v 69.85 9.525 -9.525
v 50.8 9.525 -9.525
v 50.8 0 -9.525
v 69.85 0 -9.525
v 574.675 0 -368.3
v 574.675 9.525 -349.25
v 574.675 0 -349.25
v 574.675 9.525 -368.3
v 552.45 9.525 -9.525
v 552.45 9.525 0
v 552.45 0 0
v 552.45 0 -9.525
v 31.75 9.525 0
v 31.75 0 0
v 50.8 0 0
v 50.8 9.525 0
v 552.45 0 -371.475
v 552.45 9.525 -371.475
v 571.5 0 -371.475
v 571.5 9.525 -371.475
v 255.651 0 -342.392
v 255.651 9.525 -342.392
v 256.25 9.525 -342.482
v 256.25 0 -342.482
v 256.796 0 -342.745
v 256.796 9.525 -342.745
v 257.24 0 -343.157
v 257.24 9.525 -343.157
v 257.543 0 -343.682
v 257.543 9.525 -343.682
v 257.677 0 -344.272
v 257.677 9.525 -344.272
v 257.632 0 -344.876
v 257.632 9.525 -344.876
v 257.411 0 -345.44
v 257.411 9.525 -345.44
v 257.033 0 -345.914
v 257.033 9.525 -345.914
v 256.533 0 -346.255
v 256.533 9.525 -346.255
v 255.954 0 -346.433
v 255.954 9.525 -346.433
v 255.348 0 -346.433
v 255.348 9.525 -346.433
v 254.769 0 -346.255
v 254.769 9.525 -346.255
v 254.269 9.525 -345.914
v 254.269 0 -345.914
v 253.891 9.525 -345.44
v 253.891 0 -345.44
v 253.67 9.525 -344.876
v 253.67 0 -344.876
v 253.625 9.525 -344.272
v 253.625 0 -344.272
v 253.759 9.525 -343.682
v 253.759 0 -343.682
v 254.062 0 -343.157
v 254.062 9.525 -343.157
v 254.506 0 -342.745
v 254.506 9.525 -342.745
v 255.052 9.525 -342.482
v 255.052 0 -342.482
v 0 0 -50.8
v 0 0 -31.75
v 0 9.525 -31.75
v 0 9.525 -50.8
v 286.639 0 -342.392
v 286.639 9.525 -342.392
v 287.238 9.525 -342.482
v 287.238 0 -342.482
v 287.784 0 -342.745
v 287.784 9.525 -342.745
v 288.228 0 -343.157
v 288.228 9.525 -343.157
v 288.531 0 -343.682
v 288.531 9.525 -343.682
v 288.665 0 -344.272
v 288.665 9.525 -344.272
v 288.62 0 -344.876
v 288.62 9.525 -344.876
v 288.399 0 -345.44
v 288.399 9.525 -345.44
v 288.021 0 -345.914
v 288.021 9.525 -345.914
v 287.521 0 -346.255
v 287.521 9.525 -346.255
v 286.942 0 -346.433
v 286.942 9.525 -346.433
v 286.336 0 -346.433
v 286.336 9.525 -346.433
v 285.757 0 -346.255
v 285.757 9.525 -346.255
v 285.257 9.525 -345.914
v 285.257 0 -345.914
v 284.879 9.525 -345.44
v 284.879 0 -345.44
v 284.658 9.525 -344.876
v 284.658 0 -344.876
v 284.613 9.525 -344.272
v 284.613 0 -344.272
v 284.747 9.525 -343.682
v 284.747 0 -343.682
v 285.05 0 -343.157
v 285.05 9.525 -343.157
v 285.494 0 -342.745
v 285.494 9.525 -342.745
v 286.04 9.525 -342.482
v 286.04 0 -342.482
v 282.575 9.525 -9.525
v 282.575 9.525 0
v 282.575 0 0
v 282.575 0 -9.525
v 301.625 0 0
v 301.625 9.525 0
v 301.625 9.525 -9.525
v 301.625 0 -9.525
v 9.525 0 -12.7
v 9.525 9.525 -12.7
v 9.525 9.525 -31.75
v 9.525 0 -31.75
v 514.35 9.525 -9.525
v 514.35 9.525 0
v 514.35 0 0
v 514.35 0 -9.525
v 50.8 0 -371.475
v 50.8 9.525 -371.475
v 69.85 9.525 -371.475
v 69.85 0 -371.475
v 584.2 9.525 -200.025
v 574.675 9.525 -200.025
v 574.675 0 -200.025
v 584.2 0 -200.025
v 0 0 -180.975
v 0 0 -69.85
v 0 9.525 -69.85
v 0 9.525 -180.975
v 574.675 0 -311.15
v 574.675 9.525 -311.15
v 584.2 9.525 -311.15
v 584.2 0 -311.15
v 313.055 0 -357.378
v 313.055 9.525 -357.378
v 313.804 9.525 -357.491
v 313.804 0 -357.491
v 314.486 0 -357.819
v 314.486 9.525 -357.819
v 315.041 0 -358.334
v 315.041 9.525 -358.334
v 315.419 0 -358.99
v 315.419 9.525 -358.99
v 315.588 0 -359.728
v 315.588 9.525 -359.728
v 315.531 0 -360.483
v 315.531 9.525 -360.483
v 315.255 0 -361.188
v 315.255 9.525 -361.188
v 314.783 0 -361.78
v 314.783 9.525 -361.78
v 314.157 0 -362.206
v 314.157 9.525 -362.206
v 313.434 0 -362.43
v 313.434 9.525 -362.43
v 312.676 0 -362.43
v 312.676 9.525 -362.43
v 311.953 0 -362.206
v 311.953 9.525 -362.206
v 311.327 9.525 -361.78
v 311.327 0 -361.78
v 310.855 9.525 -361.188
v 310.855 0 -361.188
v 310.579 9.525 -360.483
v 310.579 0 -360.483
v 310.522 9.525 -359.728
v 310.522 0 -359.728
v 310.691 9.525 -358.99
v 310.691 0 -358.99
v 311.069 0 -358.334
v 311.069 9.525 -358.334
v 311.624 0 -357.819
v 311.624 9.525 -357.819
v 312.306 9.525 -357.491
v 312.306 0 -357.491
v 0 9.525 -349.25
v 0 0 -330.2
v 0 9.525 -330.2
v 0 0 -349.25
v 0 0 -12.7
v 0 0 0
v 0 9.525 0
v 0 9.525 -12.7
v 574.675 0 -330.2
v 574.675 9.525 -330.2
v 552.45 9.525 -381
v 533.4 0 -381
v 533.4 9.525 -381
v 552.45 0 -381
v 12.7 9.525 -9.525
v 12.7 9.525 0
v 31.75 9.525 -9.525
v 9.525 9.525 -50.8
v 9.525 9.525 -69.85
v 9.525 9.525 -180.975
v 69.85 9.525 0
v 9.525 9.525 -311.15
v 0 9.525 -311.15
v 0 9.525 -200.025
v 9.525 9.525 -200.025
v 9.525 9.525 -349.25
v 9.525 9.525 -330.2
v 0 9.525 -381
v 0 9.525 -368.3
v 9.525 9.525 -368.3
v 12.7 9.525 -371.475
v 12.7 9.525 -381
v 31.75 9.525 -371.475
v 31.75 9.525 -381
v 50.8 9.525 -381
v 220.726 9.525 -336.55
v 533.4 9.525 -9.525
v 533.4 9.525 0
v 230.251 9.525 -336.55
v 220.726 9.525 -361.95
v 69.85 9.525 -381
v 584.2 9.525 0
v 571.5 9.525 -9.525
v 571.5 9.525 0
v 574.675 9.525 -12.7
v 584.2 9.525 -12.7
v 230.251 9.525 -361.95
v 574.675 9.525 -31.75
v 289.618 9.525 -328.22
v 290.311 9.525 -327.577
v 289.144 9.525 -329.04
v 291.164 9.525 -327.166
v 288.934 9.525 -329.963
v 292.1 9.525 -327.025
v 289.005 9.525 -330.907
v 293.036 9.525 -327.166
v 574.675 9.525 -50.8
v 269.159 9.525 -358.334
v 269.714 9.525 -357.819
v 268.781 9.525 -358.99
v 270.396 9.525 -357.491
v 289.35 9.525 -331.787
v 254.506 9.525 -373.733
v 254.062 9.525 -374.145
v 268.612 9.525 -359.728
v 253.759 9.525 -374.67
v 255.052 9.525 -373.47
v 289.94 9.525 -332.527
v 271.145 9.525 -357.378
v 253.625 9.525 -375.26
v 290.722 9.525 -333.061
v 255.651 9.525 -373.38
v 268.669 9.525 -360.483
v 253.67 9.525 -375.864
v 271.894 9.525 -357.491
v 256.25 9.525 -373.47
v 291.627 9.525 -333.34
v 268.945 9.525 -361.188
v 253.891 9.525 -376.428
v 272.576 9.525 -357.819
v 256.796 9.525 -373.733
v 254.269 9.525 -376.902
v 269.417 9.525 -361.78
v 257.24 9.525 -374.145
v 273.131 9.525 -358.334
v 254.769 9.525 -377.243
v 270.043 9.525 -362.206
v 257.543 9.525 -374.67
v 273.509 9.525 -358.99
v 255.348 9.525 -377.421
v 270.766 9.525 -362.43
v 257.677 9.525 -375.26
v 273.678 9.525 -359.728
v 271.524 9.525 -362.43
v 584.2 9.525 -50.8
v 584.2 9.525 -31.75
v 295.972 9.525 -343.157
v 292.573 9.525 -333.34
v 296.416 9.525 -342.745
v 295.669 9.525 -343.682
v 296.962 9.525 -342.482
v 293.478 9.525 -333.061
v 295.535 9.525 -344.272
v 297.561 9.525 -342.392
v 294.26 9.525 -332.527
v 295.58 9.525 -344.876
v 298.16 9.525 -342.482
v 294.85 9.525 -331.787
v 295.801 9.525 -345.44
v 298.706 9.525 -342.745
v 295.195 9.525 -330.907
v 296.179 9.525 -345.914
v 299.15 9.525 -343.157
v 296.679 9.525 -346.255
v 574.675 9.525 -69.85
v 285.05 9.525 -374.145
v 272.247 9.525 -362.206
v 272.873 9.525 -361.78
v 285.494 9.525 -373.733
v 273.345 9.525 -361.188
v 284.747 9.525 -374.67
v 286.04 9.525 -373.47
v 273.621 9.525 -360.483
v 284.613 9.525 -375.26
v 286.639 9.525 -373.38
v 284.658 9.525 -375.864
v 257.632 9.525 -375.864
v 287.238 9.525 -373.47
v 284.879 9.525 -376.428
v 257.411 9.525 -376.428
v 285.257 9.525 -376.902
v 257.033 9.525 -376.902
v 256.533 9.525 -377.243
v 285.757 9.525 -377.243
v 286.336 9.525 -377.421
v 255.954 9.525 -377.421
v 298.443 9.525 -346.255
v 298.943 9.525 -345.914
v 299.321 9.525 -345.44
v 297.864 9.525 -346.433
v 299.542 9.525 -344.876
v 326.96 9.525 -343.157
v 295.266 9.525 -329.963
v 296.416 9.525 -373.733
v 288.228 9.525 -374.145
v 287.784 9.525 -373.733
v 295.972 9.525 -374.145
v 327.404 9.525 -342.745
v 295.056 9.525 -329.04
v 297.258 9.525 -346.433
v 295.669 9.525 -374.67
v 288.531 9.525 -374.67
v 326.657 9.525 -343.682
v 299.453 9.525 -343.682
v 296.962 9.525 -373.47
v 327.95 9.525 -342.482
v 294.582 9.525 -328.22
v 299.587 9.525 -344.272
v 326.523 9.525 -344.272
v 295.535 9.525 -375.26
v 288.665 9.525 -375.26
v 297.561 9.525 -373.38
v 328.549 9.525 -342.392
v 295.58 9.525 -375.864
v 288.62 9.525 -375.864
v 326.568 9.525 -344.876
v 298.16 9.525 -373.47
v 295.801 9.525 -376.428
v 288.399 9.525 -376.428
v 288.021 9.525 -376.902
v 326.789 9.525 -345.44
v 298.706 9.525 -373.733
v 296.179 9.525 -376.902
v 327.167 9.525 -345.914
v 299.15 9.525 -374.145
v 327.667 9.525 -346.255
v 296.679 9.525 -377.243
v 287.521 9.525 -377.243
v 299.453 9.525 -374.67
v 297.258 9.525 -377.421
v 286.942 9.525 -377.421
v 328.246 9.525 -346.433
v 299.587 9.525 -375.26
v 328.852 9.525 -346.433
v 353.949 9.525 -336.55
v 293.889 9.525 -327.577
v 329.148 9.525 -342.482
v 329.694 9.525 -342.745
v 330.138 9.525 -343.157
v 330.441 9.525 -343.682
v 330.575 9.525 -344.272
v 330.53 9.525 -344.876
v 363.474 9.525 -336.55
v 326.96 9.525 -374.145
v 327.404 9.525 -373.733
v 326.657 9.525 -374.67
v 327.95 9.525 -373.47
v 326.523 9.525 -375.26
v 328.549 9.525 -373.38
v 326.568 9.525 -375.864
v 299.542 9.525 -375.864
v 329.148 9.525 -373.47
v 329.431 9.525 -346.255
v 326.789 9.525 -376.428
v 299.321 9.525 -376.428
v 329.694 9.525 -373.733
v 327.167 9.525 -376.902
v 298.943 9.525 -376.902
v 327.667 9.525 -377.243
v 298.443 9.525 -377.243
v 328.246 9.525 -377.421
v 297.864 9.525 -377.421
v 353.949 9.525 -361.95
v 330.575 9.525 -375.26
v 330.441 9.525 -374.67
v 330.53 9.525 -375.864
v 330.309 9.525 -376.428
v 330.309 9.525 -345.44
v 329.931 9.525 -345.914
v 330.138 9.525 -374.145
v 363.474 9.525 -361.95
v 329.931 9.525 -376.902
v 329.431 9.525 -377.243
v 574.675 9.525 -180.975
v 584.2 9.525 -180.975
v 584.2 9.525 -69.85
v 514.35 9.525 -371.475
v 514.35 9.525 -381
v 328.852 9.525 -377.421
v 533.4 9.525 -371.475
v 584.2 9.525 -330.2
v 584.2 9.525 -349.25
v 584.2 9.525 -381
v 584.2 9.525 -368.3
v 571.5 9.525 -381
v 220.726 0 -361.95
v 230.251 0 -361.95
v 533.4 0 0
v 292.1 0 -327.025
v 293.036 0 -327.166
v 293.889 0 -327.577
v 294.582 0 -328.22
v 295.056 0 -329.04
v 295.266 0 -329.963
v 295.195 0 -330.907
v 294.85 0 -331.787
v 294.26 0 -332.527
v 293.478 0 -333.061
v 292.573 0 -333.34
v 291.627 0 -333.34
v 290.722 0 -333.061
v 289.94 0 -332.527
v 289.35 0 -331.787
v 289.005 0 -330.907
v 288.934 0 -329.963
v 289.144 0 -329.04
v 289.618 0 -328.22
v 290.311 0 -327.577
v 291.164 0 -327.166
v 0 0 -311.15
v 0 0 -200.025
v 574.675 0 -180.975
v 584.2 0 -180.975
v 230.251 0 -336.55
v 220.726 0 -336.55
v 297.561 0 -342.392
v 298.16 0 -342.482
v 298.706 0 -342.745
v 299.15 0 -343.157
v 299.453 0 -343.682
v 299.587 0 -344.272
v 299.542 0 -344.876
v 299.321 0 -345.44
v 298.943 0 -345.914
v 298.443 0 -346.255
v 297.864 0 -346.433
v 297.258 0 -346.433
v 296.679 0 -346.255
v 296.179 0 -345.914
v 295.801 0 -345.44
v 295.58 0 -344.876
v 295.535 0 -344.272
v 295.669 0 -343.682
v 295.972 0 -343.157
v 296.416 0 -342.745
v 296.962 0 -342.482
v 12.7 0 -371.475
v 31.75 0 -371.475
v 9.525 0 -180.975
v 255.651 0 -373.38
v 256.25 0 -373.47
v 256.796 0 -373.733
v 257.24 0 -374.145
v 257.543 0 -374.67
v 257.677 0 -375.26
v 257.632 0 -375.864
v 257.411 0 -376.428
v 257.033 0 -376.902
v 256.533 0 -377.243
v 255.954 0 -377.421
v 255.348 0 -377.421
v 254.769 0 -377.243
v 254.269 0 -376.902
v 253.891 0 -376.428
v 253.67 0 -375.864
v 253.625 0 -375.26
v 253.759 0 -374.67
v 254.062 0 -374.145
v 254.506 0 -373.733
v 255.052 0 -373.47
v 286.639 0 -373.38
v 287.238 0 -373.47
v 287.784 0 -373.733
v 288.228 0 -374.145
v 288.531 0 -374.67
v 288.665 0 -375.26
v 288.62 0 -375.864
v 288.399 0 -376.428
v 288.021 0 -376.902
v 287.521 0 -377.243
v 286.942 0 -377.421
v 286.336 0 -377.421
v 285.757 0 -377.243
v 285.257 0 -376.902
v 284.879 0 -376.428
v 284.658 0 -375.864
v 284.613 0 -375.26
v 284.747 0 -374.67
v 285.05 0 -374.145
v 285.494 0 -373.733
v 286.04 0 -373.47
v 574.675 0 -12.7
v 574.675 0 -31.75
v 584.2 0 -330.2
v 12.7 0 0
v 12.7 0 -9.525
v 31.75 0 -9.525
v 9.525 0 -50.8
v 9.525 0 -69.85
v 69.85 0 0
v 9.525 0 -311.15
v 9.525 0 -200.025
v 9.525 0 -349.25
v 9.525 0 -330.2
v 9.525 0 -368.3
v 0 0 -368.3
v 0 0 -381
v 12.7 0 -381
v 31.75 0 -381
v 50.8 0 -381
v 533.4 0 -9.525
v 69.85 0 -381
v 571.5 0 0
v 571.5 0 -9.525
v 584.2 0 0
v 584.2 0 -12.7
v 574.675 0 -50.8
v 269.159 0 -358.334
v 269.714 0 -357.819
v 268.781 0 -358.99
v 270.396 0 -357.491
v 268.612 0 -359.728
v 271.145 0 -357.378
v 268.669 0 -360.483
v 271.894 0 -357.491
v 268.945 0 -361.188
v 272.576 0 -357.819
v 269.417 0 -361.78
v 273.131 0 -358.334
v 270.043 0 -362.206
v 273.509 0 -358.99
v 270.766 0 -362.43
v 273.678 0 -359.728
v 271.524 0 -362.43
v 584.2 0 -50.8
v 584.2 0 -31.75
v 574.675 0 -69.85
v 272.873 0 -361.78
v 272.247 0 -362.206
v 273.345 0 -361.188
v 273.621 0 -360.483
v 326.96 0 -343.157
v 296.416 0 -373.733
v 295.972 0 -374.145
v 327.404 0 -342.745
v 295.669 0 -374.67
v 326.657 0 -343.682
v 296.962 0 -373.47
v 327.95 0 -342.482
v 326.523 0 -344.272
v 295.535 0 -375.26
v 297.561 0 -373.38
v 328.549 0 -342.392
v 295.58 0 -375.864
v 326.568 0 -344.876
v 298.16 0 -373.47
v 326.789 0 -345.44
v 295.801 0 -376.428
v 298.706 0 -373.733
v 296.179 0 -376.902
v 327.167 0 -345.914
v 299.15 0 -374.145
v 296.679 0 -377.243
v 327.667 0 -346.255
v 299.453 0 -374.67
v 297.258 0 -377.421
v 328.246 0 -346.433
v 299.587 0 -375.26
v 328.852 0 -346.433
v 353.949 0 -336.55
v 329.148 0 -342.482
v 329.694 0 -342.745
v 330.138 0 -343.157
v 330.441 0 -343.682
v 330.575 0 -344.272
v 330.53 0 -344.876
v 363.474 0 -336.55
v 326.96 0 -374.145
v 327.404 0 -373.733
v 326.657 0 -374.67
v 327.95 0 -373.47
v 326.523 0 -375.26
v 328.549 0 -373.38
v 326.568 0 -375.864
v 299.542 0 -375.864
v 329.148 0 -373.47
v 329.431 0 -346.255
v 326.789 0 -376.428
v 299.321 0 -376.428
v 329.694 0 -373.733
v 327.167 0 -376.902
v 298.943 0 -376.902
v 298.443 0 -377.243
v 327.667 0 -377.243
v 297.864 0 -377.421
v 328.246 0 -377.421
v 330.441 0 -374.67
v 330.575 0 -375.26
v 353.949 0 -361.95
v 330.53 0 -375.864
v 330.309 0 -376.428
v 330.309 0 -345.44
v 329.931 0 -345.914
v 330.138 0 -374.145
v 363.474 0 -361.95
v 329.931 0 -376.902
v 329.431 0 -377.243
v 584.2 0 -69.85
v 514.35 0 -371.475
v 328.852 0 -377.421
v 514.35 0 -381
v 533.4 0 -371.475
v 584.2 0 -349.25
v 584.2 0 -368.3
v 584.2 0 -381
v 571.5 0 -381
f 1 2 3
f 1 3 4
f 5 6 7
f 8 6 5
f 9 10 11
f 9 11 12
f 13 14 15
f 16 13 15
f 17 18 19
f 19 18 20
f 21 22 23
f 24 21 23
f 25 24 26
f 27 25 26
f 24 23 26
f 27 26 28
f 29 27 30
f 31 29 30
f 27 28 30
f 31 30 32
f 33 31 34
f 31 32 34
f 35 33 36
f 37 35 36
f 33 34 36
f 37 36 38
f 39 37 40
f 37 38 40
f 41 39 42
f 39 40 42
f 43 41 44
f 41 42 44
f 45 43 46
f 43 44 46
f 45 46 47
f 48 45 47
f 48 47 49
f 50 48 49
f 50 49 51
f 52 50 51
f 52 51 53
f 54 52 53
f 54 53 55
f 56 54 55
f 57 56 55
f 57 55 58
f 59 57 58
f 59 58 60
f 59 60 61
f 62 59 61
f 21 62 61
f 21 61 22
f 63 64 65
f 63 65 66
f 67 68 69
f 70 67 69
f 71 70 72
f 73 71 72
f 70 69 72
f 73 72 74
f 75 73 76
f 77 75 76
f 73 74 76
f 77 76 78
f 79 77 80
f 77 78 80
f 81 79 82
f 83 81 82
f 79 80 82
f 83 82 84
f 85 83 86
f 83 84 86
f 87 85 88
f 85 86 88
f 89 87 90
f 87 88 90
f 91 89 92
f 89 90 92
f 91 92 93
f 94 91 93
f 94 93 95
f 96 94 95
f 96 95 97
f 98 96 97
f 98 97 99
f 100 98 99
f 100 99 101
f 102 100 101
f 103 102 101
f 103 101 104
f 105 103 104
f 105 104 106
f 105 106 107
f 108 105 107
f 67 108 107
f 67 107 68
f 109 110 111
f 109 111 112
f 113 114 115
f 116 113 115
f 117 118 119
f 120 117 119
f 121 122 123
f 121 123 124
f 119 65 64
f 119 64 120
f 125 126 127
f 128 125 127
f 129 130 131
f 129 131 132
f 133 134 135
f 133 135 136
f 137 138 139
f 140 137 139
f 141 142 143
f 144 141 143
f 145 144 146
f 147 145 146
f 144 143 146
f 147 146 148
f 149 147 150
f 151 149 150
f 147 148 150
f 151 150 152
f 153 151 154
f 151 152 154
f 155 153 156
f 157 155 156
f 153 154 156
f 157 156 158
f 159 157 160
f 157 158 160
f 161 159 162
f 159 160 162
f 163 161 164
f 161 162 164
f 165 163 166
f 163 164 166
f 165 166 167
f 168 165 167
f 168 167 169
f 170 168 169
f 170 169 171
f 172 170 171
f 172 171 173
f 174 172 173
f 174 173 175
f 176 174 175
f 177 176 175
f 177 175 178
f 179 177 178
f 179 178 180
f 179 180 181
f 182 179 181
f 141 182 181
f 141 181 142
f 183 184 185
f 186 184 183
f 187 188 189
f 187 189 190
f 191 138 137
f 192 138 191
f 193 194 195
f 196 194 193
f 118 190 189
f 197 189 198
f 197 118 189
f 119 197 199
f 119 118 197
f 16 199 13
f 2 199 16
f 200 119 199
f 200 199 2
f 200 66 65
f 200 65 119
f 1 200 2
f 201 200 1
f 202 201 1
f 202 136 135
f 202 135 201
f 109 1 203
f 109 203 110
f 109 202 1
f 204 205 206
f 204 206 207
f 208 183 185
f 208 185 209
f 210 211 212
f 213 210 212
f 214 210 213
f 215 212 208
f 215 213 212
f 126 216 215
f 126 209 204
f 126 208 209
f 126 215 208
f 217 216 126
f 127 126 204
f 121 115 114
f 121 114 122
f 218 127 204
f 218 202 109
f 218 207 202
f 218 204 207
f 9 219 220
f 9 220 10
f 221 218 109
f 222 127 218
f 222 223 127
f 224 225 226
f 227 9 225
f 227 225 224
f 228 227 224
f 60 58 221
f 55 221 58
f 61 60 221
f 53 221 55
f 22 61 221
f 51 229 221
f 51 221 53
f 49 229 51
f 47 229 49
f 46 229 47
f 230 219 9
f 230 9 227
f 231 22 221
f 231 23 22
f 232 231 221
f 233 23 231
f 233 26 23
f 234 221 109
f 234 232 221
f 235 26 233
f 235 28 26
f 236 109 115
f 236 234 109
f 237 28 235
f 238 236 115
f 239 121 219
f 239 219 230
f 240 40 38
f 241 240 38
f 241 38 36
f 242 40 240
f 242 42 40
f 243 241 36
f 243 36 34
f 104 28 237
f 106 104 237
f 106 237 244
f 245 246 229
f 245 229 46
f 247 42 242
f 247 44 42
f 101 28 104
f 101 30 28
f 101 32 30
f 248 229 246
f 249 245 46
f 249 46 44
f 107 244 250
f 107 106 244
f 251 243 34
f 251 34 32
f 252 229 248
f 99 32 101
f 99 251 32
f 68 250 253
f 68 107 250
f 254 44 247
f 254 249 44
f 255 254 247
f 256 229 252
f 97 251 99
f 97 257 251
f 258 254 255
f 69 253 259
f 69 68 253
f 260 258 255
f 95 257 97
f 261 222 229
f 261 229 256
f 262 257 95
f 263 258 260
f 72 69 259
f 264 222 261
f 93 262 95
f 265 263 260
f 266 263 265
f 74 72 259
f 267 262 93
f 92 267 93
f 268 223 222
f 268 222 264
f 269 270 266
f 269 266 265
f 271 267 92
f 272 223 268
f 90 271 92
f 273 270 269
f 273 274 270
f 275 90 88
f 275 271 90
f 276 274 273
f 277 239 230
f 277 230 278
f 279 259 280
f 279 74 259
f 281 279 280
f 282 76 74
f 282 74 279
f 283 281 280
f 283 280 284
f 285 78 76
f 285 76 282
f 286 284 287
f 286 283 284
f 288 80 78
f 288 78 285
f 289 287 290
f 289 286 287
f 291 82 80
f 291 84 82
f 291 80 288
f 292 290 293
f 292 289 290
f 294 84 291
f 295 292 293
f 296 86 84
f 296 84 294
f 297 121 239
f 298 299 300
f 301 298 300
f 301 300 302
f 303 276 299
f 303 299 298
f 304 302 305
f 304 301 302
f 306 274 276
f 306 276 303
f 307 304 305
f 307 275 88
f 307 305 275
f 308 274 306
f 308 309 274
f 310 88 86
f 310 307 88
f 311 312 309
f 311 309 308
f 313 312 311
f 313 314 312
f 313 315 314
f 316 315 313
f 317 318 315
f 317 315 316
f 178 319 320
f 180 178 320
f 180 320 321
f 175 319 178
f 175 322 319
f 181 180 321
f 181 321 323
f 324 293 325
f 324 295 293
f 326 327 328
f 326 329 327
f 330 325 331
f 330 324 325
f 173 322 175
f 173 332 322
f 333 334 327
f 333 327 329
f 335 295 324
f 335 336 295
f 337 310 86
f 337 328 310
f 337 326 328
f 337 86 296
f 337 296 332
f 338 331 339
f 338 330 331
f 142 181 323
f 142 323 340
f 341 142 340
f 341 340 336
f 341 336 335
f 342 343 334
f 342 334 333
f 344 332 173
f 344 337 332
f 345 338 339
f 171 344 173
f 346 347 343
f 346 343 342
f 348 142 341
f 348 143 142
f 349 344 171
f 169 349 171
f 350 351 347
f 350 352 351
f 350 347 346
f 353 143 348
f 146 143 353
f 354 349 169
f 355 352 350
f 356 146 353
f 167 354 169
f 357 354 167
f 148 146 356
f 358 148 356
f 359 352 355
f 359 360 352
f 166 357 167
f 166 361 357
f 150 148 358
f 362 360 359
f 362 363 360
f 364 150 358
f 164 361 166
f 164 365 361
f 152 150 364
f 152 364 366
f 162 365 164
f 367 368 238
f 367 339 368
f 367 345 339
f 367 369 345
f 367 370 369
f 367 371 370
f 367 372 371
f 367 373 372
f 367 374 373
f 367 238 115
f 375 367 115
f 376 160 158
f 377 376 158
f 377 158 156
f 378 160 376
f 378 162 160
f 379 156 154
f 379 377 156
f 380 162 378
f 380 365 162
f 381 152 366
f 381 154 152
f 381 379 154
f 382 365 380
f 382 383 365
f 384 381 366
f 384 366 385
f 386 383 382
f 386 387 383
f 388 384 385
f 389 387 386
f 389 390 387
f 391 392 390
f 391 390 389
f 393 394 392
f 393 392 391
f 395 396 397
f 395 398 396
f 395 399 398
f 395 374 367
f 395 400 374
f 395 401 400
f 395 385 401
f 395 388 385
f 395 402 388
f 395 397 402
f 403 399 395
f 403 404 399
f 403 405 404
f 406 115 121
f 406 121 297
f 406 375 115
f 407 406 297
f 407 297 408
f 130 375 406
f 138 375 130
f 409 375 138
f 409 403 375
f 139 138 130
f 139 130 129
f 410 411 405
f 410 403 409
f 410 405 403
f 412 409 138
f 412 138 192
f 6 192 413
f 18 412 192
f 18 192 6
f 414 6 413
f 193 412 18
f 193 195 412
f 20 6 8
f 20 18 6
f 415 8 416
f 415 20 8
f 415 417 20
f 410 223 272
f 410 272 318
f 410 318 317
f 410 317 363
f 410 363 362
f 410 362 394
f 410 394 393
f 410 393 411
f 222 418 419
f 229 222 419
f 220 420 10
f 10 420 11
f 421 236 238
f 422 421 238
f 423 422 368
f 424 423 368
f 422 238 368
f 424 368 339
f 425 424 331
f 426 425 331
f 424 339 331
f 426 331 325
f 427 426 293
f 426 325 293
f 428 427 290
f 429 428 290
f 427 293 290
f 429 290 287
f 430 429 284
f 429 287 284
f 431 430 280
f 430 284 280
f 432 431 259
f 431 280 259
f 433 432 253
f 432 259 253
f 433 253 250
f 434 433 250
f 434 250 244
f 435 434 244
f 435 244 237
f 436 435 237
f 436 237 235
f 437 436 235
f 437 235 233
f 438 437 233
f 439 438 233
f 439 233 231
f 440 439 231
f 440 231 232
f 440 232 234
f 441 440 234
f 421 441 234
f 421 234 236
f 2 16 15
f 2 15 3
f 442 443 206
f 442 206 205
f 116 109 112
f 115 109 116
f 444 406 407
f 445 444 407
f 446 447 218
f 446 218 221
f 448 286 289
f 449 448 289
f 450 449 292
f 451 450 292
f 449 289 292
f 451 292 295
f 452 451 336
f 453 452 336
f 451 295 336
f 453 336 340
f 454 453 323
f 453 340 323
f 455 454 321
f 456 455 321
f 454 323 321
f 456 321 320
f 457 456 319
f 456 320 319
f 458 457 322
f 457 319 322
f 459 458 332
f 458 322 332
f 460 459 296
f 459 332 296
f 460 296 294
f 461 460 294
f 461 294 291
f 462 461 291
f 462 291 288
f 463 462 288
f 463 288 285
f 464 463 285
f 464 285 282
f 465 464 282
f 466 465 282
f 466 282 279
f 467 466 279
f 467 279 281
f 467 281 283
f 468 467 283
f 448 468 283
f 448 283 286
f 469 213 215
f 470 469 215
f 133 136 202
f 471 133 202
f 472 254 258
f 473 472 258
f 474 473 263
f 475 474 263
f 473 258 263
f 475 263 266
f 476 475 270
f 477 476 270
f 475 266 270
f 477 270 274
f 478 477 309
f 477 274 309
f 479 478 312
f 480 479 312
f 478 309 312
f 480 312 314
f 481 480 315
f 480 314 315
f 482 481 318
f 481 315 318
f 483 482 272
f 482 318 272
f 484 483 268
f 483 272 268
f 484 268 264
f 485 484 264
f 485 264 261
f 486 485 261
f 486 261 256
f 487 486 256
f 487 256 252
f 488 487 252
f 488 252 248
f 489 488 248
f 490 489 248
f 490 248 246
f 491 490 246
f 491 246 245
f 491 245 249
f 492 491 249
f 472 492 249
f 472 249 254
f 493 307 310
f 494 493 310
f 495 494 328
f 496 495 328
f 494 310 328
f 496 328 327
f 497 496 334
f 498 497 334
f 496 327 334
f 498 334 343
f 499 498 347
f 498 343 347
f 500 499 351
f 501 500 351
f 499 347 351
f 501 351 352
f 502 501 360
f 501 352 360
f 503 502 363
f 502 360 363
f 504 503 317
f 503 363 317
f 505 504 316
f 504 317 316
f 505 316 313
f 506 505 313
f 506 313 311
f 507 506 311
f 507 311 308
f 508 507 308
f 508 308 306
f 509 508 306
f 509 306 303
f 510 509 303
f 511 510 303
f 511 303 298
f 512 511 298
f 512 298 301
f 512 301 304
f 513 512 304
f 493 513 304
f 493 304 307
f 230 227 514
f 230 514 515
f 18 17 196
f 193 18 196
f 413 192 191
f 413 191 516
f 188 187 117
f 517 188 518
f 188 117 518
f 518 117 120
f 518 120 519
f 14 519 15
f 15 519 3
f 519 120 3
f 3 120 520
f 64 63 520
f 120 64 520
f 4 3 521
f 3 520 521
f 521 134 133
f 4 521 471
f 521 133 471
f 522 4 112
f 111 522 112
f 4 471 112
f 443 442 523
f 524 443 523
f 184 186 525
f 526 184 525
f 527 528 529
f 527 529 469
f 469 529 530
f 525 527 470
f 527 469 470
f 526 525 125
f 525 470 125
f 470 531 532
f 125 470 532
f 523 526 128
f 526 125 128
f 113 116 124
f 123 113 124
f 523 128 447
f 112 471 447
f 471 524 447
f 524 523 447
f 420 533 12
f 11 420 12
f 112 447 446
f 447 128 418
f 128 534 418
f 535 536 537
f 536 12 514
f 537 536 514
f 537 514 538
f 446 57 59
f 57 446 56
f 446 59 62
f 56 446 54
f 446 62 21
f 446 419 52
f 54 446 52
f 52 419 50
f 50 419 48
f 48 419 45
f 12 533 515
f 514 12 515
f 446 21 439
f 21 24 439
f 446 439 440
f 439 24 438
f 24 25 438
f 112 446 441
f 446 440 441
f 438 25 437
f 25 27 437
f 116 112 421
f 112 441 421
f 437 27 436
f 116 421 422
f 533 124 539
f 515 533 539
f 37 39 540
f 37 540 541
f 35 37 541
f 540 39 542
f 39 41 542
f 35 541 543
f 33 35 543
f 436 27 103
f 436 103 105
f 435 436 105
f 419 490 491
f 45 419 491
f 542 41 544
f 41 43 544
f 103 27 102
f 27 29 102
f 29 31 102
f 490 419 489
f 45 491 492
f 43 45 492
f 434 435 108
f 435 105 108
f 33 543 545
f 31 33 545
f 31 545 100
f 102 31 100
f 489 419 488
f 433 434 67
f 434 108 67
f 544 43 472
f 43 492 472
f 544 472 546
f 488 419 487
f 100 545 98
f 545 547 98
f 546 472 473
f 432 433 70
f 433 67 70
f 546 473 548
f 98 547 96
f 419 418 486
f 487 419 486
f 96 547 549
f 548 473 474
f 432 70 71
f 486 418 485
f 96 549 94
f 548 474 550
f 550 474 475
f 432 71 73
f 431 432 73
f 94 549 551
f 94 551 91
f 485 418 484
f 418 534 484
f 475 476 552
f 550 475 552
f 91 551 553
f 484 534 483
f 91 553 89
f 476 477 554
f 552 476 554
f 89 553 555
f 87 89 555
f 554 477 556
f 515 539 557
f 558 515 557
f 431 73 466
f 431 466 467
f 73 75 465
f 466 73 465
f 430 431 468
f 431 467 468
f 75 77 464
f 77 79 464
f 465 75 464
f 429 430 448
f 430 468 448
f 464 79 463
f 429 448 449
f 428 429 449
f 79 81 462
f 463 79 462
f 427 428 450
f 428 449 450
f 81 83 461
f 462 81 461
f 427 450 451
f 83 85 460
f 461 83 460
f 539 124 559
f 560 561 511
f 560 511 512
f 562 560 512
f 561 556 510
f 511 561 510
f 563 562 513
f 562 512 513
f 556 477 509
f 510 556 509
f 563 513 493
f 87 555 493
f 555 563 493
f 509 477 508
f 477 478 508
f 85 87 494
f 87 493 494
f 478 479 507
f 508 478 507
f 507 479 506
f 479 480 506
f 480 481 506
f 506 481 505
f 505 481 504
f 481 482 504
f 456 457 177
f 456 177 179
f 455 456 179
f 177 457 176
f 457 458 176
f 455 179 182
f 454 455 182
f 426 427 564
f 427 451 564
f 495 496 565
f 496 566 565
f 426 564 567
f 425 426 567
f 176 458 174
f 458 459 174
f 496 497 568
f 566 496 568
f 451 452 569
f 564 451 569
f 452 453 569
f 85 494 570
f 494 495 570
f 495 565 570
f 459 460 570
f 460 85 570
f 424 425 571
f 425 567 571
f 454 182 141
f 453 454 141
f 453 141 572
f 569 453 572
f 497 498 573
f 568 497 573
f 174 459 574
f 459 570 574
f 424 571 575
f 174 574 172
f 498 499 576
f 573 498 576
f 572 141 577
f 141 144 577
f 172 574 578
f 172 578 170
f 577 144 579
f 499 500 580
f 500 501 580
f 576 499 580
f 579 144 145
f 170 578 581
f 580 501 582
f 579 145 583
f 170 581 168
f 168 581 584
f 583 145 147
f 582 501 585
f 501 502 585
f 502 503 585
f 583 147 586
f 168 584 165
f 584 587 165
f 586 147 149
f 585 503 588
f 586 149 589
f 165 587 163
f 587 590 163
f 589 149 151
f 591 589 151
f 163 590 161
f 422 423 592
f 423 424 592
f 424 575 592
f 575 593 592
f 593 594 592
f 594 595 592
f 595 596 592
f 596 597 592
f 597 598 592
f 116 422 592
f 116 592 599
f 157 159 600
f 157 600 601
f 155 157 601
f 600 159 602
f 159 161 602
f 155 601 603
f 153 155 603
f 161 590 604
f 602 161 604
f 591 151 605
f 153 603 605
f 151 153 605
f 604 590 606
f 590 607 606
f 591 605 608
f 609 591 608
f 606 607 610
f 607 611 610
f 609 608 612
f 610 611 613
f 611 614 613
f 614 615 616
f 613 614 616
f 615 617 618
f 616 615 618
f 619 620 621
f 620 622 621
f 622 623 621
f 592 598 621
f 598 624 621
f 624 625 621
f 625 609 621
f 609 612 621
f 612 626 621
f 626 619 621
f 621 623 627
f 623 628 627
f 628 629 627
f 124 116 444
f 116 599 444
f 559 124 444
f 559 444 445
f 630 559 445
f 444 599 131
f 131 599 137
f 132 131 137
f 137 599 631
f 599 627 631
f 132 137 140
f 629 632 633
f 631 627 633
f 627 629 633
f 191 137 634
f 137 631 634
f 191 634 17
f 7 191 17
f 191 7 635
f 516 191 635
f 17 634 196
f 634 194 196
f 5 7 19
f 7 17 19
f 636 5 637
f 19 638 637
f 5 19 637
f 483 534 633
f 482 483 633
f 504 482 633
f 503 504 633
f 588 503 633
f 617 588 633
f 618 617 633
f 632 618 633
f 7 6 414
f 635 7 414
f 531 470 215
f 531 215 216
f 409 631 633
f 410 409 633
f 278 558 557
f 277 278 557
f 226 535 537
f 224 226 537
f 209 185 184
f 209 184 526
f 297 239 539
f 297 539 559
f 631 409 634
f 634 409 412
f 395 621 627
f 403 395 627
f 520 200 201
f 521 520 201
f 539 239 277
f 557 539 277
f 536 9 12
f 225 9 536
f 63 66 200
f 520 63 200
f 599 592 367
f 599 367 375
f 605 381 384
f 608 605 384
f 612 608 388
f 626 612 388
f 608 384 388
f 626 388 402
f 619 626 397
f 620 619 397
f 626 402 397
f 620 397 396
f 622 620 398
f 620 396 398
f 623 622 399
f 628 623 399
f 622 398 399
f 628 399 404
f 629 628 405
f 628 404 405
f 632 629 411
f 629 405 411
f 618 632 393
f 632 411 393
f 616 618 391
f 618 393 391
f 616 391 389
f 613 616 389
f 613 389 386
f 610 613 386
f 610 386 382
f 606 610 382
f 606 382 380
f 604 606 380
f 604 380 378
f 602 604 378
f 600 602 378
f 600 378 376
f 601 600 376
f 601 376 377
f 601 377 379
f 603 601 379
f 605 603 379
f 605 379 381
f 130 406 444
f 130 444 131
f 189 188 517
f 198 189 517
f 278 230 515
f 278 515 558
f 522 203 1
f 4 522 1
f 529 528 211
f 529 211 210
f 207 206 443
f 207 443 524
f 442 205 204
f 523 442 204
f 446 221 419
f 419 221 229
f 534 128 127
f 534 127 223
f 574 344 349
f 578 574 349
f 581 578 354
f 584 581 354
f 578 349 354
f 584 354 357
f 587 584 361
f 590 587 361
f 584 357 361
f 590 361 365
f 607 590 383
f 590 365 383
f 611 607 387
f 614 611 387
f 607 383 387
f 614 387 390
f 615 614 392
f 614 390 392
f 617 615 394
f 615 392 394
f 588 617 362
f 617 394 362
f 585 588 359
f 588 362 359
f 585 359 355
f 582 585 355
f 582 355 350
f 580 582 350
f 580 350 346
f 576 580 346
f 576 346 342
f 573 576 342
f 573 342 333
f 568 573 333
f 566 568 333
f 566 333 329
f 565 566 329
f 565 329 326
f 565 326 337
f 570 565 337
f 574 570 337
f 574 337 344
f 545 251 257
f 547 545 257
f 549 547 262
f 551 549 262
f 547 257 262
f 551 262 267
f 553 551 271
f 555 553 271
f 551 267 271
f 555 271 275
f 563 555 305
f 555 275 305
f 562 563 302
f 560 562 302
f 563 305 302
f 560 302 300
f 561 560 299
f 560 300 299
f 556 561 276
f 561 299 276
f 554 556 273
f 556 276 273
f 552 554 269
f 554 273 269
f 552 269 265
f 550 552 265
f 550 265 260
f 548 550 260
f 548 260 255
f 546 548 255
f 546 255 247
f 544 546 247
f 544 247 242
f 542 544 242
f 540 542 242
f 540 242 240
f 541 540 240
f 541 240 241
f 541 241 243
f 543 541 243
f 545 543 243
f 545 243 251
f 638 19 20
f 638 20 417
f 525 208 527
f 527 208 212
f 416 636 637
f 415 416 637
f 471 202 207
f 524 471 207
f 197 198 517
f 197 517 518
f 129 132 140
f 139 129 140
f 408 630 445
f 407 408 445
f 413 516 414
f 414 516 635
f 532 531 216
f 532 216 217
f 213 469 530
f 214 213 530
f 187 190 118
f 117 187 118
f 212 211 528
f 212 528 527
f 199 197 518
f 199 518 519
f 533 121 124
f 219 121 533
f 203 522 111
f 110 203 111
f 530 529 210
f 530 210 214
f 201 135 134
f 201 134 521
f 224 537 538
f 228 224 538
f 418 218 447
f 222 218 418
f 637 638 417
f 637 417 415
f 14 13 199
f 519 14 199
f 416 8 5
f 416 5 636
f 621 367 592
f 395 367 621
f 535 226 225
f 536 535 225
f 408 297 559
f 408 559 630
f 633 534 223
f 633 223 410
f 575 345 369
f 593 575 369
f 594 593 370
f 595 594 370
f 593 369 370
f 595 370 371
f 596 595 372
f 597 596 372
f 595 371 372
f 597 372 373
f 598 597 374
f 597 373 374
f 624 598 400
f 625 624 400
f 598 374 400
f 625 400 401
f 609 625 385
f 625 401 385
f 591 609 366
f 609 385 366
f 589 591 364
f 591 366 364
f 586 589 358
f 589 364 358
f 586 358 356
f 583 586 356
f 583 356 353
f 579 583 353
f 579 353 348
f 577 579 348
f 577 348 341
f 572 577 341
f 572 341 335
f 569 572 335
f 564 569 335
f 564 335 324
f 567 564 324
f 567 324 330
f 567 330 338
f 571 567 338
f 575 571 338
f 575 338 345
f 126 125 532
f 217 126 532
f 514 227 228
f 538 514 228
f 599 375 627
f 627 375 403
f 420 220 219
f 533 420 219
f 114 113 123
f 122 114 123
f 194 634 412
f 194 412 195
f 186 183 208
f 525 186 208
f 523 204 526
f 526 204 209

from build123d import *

# Parameters (mm, degrees)
SKETCH1_W           = 584.2
SKETCH1_H           = 381
BOSS_EXTRUDE1_DEPTH = 9.525
SKETCH2_W           = 9.525
SKETCH2_H           = 19.05
SKETCH2_W_2         = 19.05
SKETCH2_H_2         = 9.525
CUT_EXTRUDE1_DEPTH  = 698.525172037
SKETCH3_R           = 2.032
SKETCH3_R_2         = 2.54
SKETCH3_R_3         = 3.175
SKETCH3_W           = 9.525
SKETCH3_H           = 25.4
CUT_EXTRUDE2_DEPTH  = 698.525172037


with BuildPart() as part:
    # Sketch1 → Boss-Extrude1 (new body)
    with BuildSketch(Plane(origin=(0, 0, 0), x_dir=(1, 0, 0), z_dir=(0, 1, 0))):
        with Locations((292.1, 190.5)):
            Rectangle(SKETCH1_W, SKETCH1_H)
    extrude(amount=BOSS_EXTRUDE1_DEPTH)

    # Sketch2 → Cut-Extrude1 (cut, through all)
    with BuildSketch(Plane(origin=(0, 9.525, 0), x_dir=(1, 0, 0), z_dir=(0, 1, 0))):
        with Locations((4.7625, 358.775)):
            Rectangle(SKETCH2_W, SKETCH2_H)
        with Locations((22.225, 376.2375)):
            Rectangle(SKETCH2_W_2, SKETCH2_H_2)
        with Locations((561.975, 376.2375)):
            Rectangle(SKETCH2_W_2, SKETCH2_H_2)
        with Locations((579.4375, 358.775)):
            Rectangle(SKETCH2_W, SKETCH2_H)
        with Locations((579.4375, 22.225)):
            Rectangle(SKETCH2_W, SKETCH2_H)
        with Locations((561.975, 4.7625)):
            Rectangle(SKETCH2_W_2, SKETCH2_H_2)
        with Locations((4.7625, 22.225)):
            Rectangle(SKETCH2_W, SKETCH2_H)
        with Locations((22.225, 4.7625)):
            Rectangle(SKETCH2_W_2, SKETCH2_H_2)
        with Locations((292.1, 4.7625)):
            Rectangle(SKETCH2_W_2, SKETCH2_H_2)
        with Locations((4.7625, 190.5)):
            Rectangle(SKETCH2_W, SKETCH2_H)
        with Locations((579.4375, 190.5)):
            Rectangle(SKETCH2_W, SKETCH2_H)
        with Locations((60.325, 376.2375)):
            Rectangle(SKETCH2_W_2, SKETCH2_H_2)
        with Locations((4.7625, 320.675)):
            Rectangle(SKETCH2_W, SKETCH2_H)
        with Locations((523.875, 376.2375)):
            Rectangle(SKETCH2_W_2, SKETCH2_H_2)
        with Locations((579.4375, 320.675)):
            Rectangle(SKETCH2_W, SKETCH2_H)
        with Locations((579.4375, 60.325)):
            Rectangle(SKETCH2_W, SKETCH2_H)
        with Locations((523.875, 4.7625)):
            Rectangle(SKETCH2_W_2, SKETCH2_H_2)
        with Locations((4.7625, 60.325)):
            Rectangle(SKETCH2_W, SKETCH2_H)
        with Locations((60.325, 4.7625)):
            Rectangle(SKETCH2_W_2, SKETCH2_H_2)
    extrude(amount=-CUT_EXTRUDE1_DEPTH, mode=Mode.SUBTRACT)

    # Sketch3 → Cut-Extrude2 (cut, through all)
    with BuildSketch(Plane(origin=(0, 9.525, 0), x_dir=(1, 0, 0), z_dir=(0, 1, 0))):
        with Locations(Location((255.651, 375.412, 0), (0, 0, 270))):
            Circle(SKETCH3_R)
        with Locations(Location((328.549, 375.412, 0), (0, 0, 270))):
            Circle(SKETCH3_R)
        with Locations(Location((286.639, 375.412, 0), (0, 0, 270))):
            Circle(SKETCH3_R)
        with Locations(Location((297.561, 375.412, 0), (0, 0, 270))):
            Circle(SKETCH3_R)
        with Locations(Location((255.651, 344.424, 0), (0, 0, 270))):
            Circle(SKETCH3_R)
        with Locations(Location((286.639, 344.424, 0), (0, 0, 270))):
            Circle(SKETCH3_R)
        with Locations(Location((297.561, 344.424, 0), (0, 0, 270))):
            Circle(SKETCH3_R)
        with Locations(Location((328.549, 344.424, 0), (0, 0, 270))):
            Circle(SKETCH3_R)
        with Locations(Location((271.145, 359.918, 0), (0, 0, 270))):
            Circle(SKETCH3_R_2)
        with Locations(Location((313.055, 359.918, 0), (0, 0, 270))):
            Circle(SKETCH3_R_2)
        with Locations(Location((292.1, 330.2, 0), (0, 0, 270))):
            Circle(SKETCH3_R_3)
        with Locations((358.7115, 349.25)):
            Rectangle(SKETCH3_W, SKETCH3_H)
        with Locations((225.4885, 349.25)):
            Rectangle(SKETCH3_W, SKETCH3_H)
    extrude(amount=-CUT_EXTRUDE2_DEPTH, mode=Mode.SUBTRACT)


solid = part.part
